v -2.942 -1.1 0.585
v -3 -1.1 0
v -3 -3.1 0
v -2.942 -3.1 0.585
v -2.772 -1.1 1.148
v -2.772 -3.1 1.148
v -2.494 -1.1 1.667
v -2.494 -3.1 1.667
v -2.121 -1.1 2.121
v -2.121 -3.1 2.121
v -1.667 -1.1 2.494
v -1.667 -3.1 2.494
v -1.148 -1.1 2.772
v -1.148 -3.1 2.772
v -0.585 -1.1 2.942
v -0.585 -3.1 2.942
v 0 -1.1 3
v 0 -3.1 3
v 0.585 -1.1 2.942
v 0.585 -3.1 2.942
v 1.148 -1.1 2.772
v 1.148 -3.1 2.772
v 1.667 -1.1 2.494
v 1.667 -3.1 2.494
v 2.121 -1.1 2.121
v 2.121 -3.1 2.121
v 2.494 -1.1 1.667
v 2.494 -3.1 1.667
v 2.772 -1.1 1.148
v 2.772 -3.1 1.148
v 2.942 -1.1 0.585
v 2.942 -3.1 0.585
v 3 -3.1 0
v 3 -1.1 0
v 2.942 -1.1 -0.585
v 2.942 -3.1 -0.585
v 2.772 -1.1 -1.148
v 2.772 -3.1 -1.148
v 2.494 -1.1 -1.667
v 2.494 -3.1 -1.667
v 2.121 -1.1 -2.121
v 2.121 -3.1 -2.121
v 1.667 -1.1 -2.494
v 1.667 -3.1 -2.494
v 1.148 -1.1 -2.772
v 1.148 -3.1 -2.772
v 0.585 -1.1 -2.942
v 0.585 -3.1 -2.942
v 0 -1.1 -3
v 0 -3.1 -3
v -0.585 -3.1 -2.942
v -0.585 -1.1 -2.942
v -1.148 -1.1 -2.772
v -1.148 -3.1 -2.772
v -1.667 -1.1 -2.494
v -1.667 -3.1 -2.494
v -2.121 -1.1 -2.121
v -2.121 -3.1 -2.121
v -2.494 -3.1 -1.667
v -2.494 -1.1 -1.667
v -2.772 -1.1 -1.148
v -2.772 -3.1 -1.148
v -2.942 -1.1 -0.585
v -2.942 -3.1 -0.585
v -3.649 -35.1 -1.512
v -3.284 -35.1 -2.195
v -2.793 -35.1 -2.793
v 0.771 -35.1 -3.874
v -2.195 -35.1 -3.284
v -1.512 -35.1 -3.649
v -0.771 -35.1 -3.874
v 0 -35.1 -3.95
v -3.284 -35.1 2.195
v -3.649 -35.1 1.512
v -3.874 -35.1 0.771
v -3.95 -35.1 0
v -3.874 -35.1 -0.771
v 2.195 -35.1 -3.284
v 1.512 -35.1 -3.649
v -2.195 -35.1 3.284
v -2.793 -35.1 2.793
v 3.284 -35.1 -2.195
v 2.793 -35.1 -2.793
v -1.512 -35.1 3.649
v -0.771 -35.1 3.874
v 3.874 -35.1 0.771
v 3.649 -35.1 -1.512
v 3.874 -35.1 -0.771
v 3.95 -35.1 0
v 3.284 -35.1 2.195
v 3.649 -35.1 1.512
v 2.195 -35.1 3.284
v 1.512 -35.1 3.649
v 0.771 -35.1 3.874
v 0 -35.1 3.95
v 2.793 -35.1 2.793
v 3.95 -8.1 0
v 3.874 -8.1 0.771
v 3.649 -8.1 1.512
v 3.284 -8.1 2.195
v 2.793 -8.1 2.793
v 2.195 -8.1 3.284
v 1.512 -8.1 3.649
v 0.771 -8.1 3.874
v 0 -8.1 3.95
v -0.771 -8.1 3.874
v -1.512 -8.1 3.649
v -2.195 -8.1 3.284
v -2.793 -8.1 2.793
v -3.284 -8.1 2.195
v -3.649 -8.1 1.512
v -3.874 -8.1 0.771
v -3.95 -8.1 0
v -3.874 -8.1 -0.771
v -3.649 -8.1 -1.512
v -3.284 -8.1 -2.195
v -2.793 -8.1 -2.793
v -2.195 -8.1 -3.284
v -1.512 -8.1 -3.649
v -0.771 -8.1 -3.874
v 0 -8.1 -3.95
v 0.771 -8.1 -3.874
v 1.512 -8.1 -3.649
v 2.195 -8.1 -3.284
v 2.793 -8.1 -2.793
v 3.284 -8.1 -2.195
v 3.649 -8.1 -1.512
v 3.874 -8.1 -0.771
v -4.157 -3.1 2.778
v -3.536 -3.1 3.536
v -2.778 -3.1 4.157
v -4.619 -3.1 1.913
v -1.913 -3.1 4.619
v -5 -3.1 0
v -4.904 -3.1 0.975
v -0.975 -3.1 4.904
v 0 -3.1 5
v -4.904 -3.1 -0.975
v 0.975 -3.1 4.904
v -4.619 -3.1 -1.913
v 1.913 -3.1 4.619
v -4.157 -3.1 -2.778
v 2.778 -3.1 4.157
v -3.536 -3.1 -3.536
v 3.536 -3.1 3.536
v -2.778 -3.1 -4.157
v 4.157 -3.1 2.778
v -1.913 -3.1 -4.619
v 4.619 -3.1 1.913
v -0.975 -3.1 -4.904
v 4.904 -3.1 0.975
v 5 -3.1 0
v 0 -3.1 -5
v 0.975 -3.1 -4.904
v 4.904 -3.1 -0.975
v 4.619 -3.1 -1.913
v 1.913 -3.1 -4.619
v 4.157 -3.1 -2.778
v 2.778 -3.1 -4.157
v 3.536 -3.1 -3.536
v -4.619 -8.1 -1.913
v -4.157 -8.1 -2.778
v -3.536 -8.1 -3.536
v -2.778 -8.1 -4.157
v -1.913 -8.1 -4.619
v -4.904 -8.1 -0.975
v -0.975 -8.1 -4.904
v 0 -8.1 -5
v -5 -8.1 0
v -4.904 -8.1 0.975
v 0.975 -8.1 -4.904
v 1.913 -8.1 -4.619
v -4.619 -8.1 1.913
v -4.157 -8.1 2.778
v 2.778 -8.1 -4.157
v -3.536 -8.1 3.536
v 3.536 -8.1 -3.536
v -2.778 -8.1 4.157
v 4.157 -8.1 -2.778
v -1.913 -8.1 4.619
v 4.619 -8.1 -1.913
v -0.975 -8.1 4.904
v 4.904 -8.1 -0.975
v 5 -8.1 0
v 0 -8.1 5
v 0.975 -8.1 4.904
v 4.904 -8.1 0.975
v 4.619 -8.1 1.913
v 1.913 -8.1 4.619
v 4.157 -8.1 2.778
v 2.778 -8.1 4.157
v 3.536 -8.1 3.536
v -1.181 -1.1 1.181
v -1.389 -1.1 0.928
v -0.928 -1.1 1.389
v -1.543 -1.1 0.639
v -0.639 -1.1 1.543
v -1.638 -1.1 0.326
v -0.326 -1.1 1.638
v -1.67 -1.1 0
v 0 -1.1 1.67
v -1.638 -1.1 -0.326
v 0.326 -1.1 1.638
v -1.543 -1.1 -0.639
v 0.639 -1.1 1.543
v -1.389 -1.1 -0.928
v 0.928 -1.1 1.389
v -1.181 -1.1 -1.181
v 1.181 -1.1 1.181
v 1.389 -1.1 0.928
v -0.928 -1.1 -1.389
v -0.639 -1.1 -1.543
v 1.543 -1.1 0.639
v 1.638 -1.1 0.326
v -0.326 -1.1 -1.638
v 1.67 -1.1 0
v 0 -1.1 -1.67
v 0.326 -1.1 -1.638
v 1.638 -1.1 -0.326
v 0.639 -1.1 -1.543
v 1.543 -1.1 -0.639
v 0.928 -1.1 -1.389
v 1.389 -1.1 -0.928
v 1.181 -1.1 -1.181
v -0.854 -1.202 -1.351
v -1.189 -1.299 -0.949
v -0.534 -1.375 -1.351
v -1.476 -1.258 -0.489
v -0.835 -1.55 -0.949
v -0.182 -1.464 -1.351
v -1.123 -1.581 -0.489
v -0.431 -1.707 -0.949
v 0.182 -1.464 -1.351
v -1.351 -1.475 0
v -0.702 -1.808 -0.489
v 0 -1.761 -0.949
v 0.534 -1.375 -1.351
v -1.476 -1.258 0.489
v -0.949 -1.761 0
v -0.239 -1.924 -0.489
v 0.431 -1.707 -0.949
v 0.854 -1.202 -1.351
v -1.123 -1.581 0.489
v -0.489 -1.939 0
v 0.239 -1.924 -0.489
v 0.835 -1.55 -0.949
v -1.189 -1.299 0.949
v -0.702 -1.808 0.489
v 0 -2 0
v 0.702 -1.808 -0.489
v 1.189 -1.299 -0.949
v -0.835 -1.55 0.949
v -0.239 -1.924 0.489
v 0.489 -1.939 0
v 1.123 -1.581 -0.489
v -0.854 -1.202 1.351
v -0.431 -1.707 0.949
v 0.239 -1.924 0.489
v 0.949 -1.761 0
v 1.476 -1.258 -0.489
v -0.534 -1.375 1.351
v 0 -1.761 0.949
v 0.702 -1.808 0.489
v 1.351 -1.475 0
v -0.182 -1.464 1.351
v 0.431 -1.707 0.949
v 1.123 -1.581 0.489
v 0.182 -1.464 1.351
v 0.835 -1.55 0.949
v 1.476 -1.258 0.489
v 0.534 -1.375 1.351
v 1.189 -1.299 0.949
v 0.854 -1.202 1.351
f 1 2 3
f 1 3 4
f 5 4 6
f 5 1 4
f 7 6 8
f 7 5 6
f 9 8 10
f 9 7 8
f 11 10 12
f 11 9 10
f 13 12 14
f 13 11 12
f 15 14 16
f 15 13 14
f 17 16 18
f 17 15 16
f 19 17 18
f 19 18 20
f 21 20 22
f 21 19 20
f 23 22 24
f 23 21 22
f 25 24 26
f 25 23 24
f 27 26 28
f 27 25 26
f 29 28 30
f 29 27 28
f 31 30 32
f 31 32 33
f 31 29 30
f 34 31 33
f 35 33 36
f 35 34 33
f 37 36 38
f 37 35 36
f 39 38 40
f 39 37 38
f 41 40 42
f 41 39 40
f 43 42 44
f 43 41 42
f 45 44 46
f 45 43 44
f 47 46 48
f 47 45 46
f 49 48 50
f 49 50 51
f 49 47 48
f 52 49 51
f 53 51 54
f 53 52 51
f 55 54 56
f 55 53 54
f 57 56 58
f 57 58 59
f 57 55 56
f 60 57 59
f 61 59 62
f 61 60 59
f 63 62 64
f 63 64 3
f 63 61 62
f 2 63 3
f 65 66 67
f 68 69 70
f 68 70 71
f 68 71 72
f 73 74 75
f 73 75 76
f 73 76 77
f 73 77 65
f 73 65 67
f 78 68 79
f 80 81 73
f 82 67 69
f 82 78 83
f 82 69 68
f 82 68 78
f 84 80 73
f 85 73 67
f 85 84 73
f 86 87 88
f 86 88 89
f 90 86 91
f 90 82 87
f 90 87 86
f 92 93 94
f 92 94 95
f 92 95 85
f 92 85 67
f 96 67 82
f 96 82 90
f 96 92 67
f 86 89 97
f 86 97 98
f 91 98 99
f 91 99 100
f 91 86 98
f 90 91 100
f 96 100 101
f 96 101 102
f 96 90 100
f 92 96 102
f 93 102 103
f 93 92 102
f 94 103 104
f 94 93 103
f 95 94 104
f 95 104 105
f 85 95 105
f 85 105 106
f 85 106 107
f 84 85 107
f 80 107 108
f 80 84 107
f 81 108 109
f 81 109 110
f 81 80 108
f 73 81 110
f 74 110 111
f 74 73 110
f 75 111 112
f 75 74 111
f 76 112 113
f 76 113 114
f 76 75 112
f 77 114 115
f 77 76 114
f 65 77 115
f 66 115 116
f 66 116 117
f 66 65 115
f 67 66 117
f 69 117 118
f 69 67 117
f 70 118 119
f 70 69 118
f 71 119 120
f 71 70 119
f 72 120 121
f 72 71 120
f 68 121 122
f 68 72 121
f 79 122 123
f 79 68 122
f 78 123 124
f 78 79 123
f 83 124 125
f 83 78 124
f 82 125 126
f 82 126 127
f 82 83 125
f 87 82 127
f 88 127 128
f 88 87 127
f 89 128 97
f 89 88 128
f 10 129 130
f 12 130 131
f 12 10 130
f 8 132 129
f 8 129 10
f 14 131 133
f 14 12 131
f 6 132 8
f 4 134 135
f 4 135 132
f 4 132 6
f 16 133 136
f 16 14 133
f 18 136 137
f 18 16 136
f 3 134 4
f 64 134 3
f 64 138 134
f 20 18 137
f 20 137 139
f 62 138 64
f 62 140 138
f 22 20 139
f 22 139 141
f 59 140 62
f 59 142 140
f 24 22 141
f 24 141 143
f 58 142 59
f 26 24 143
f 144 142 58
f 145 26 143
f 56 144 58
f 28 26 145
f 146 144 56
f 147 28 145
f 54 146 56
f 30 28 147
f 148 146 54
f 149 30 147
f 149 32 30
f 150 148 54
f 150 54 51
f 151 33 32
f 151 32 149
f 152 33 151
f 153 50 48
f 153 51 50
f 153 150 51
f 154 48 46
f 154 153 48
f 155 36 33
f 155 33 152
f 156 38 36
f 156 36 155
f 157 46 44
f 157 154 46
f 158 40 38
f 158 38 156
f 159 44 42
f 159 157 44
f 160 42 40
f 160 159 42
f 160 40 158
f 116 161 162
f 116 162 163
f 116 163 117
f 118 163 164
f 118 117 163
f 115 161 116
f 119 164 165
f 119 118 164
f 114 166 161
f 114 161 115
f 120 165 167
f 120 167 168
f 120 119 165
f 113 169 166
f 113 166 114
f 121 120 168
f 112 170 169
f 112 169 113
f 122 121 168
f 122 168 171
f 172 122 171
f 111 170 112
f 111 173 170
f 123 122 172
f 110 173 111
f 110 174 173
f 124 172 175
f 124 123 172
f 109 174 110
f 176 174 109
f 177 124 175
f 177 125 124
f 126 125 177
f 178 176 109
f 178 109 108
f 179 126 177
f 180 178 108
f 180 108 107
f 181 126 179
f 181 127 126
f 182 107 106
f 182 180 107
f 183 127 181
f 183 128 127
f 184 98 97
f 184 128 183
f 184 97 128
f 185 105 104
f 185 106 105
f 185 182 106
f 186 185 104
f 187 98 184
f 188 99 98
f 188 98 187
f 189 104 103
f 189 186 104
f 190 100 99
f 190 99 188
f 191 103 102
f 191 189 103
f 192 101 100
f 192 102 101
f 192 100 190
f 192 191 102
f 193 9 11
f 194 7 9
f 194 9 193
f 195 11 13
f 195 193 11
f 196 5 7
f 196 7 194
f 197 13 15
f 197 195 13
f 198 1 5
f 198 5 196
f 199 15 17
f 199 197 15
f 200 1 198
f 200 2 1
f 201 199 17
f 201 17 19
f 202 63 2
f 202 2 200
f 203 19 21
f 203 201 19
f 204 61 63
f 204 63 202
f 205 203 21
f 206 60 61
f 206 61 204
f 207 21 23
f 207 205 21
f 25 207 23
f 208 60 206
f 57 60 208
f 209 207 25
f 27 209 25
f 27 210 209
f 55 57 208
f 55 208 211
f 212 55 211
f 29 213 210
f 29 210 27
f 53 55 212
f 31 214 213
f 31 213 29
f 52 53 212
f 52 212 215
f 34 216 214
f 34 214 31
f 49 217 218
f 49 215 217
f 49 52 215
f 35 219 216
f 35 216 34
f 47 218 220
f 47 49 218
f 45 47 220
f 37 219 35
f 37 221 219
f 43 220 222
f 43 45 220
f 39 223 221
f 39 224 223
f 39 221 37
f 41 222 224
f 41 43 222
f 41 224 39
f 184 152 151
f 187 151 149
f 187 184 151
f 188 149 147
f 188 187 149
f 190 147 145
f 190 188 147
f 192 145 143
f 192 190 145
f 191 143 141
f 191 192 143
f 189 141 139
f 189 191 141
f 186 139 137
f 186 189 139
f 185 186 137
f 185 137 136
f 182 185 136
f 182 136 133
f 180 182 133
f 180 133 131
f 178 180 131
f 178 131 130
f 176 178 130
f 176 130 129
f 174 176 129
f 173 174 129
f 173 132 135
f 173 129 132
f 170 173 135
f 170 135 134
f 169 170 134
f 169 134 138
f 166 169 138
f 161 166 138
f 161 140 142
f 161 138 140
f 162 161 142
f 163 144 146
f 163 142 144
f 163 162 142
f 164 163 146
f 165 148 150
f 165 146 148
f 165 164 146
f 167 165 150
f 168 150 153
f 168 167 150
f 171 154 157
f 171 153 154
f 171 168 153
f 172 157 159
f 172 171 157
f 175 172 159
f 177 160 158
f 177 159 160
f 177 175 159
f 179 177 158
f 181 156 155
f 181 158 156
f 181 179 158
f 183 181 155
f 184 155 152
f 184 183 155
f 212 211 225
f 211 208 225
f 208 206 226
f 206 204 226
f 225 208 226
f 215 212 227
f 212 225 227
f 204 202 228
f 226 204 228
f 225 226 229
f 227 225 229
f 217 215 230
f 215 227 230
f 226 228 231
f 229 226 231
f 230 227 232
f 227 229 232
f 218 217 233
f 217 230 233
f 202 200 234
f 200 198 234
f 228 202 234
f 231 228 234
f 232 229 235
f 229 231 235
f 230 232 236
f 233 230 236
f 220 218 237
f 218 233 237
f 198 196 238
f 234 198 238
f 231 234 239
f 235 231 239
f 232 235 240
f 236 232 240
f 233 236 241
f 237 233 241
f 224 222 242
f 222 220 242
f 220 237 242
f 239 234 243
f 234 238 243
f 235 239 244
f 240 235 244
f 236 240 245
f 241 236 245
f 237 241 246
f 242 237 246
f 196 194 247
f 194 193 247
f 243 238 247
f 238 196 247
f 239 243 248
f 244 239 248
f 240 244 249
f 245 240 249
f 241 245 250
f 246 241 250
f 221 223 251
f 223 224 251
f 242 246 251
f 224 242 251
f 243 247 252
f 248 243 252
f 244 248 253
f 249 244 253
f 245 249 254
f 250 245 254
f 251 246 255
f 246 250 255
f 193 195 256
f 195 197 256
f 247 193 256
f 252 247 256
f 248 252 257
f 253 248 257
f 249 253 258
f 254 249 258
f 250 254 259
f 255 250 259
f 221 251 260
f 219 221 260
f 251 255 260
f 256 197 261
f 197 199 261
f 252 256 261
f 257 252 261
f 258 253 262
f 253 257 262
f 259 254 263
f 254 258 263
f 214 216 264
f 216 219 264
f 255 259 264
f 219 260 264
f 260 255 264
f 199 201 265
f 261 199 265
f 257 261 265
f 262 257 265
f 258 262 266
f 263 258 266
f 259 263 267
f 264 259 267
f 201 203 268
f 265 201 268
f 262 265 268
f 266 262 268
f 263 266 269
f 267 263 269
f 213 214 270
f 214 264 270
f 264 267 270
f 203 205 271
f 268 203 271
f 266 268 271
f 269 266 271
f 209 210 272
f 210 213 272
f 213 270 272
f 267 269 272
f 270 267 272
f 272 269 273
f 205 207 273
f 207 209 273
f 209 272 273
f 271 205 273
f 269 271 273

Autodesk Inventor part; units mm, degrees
ref_plane "YZ Plane" through (0, 0, 0) normal (1, 0, 0) x (0, 1, 0)
ref_plane "XZ Plane" through (0, 0, 0) normal (0, 1, 0) x (-1, 0, 0)
ref_plane "XY Plane" through (0, 0, 0) normal (0, 0, 1) x (1, 0, 0)
sketch "Sketch1" plane through (0, 0, 0) normal (0, 1, 0) x (-1, 0, 0)
  circle A0 centre (0, 0) radius 2
  circle A1 centre (0, 0) radius 3
  line L0 (0, 2) -> (0, -2)
  dimension "d0" = 4
  dimension "d1" = 6
extrude "Extrusion1" add sketch "Sketch1" against normal blind 15 contours A0 L0 | L0 A0 | A1
revolve "Revolution1" cut sketch "Sketch1" angle 360 about axis through (0, 0, 2) along (0, 0, -1) picked at (0.2893, 0.6006) contours A0 L0
sketch "Sketch2" plane through (0, 0, 0) normal (0, 1, 0) x (1, 0, 0)
  circle A0 centre (0, 0) radius 3 projected
  circle A1 centre (0, 0) radius 2 projected
extrude "Extrusion2" cut sketch "Sketch2" against normal blind 1.1 contours A0 | A1
sketch "Sketch3" plane through (0, -15, 0) normal (0, -1, 0) x (1, 0, 0)
  circle A0 centre (0, 0) radius 5
  circle A1 centre (0, 0) radius 3 projected
  dimension "d7" = 10
extrude "Extrusion3" add sketch "Sketch3" against normal blind 10
sketch "Sketch4" plane through (0, -15, 0) normal (0, -1, 0) x (1, 0, 0)
  circle A0 centre (0, 0) radius 5 projected
extrude "Extrusion4" cut sketch "Sketch4" against normal blind 5
sketch "Sketch5" plane through (0, -10, 0) normal (0, -1, 0) x (1, 0, 0)
  circle A0 centre (0, 0) radius 3.95
  dimension "d12" = 7.9
extrude "Extrusion5" add sketch "Sketch5" along normal blind 25
sketch "Sketch6" plane through (0, -5, 0) normal (0, 1, 0) x (1, 0, 0)
  circle A0 centre (0, 0) radius 3 projected
  circle A1 centre (0, 0) radius 5 projected
extrude "Extrusion6" cut sketch "Sketch6" against normal blind 0.1
sketch "Sketch7" plane through (0, -10, 0) normal (0, -1, 0) x (1, 0, 0)
  circle A0 centre (0, 0) radius 5 projected
  circle A1 centre (0, 0) radius 3.95 projected
extrude "Extrusion7" add sketch "Sketch7" along normal blind 0.1
sketch "Sketch8" plane through (0, -35, 0) normal (0, -1, 0) x (1, 0, 0)
  circle A0 centre (0, 0) radius 3.95 projected
extrude "Extrusion8" add sketch "Sketch8" along normal blind 0.1
sketch "Sketch9" plane through (0, -5.1, 0) normal (0, 1, 0) x (1, 0, 0)
  circle A0 centre (0, 0) radius 5 projected
extrude "Extrusion9" add sketch "Sketch9" along normal blind 2
sketch "Sketch10" plane through (0, -10.1, 0) normal (0, -1, 0) x (1, 0, 0)
  circle A0 centre (0, 0) radius 5 projected
  circle A1 centre (0, 0) radius 3.95 projected
extrude "Extrusion10" cut sketch "Sketch10" against normal blind 2
properties part number "BARRA"
